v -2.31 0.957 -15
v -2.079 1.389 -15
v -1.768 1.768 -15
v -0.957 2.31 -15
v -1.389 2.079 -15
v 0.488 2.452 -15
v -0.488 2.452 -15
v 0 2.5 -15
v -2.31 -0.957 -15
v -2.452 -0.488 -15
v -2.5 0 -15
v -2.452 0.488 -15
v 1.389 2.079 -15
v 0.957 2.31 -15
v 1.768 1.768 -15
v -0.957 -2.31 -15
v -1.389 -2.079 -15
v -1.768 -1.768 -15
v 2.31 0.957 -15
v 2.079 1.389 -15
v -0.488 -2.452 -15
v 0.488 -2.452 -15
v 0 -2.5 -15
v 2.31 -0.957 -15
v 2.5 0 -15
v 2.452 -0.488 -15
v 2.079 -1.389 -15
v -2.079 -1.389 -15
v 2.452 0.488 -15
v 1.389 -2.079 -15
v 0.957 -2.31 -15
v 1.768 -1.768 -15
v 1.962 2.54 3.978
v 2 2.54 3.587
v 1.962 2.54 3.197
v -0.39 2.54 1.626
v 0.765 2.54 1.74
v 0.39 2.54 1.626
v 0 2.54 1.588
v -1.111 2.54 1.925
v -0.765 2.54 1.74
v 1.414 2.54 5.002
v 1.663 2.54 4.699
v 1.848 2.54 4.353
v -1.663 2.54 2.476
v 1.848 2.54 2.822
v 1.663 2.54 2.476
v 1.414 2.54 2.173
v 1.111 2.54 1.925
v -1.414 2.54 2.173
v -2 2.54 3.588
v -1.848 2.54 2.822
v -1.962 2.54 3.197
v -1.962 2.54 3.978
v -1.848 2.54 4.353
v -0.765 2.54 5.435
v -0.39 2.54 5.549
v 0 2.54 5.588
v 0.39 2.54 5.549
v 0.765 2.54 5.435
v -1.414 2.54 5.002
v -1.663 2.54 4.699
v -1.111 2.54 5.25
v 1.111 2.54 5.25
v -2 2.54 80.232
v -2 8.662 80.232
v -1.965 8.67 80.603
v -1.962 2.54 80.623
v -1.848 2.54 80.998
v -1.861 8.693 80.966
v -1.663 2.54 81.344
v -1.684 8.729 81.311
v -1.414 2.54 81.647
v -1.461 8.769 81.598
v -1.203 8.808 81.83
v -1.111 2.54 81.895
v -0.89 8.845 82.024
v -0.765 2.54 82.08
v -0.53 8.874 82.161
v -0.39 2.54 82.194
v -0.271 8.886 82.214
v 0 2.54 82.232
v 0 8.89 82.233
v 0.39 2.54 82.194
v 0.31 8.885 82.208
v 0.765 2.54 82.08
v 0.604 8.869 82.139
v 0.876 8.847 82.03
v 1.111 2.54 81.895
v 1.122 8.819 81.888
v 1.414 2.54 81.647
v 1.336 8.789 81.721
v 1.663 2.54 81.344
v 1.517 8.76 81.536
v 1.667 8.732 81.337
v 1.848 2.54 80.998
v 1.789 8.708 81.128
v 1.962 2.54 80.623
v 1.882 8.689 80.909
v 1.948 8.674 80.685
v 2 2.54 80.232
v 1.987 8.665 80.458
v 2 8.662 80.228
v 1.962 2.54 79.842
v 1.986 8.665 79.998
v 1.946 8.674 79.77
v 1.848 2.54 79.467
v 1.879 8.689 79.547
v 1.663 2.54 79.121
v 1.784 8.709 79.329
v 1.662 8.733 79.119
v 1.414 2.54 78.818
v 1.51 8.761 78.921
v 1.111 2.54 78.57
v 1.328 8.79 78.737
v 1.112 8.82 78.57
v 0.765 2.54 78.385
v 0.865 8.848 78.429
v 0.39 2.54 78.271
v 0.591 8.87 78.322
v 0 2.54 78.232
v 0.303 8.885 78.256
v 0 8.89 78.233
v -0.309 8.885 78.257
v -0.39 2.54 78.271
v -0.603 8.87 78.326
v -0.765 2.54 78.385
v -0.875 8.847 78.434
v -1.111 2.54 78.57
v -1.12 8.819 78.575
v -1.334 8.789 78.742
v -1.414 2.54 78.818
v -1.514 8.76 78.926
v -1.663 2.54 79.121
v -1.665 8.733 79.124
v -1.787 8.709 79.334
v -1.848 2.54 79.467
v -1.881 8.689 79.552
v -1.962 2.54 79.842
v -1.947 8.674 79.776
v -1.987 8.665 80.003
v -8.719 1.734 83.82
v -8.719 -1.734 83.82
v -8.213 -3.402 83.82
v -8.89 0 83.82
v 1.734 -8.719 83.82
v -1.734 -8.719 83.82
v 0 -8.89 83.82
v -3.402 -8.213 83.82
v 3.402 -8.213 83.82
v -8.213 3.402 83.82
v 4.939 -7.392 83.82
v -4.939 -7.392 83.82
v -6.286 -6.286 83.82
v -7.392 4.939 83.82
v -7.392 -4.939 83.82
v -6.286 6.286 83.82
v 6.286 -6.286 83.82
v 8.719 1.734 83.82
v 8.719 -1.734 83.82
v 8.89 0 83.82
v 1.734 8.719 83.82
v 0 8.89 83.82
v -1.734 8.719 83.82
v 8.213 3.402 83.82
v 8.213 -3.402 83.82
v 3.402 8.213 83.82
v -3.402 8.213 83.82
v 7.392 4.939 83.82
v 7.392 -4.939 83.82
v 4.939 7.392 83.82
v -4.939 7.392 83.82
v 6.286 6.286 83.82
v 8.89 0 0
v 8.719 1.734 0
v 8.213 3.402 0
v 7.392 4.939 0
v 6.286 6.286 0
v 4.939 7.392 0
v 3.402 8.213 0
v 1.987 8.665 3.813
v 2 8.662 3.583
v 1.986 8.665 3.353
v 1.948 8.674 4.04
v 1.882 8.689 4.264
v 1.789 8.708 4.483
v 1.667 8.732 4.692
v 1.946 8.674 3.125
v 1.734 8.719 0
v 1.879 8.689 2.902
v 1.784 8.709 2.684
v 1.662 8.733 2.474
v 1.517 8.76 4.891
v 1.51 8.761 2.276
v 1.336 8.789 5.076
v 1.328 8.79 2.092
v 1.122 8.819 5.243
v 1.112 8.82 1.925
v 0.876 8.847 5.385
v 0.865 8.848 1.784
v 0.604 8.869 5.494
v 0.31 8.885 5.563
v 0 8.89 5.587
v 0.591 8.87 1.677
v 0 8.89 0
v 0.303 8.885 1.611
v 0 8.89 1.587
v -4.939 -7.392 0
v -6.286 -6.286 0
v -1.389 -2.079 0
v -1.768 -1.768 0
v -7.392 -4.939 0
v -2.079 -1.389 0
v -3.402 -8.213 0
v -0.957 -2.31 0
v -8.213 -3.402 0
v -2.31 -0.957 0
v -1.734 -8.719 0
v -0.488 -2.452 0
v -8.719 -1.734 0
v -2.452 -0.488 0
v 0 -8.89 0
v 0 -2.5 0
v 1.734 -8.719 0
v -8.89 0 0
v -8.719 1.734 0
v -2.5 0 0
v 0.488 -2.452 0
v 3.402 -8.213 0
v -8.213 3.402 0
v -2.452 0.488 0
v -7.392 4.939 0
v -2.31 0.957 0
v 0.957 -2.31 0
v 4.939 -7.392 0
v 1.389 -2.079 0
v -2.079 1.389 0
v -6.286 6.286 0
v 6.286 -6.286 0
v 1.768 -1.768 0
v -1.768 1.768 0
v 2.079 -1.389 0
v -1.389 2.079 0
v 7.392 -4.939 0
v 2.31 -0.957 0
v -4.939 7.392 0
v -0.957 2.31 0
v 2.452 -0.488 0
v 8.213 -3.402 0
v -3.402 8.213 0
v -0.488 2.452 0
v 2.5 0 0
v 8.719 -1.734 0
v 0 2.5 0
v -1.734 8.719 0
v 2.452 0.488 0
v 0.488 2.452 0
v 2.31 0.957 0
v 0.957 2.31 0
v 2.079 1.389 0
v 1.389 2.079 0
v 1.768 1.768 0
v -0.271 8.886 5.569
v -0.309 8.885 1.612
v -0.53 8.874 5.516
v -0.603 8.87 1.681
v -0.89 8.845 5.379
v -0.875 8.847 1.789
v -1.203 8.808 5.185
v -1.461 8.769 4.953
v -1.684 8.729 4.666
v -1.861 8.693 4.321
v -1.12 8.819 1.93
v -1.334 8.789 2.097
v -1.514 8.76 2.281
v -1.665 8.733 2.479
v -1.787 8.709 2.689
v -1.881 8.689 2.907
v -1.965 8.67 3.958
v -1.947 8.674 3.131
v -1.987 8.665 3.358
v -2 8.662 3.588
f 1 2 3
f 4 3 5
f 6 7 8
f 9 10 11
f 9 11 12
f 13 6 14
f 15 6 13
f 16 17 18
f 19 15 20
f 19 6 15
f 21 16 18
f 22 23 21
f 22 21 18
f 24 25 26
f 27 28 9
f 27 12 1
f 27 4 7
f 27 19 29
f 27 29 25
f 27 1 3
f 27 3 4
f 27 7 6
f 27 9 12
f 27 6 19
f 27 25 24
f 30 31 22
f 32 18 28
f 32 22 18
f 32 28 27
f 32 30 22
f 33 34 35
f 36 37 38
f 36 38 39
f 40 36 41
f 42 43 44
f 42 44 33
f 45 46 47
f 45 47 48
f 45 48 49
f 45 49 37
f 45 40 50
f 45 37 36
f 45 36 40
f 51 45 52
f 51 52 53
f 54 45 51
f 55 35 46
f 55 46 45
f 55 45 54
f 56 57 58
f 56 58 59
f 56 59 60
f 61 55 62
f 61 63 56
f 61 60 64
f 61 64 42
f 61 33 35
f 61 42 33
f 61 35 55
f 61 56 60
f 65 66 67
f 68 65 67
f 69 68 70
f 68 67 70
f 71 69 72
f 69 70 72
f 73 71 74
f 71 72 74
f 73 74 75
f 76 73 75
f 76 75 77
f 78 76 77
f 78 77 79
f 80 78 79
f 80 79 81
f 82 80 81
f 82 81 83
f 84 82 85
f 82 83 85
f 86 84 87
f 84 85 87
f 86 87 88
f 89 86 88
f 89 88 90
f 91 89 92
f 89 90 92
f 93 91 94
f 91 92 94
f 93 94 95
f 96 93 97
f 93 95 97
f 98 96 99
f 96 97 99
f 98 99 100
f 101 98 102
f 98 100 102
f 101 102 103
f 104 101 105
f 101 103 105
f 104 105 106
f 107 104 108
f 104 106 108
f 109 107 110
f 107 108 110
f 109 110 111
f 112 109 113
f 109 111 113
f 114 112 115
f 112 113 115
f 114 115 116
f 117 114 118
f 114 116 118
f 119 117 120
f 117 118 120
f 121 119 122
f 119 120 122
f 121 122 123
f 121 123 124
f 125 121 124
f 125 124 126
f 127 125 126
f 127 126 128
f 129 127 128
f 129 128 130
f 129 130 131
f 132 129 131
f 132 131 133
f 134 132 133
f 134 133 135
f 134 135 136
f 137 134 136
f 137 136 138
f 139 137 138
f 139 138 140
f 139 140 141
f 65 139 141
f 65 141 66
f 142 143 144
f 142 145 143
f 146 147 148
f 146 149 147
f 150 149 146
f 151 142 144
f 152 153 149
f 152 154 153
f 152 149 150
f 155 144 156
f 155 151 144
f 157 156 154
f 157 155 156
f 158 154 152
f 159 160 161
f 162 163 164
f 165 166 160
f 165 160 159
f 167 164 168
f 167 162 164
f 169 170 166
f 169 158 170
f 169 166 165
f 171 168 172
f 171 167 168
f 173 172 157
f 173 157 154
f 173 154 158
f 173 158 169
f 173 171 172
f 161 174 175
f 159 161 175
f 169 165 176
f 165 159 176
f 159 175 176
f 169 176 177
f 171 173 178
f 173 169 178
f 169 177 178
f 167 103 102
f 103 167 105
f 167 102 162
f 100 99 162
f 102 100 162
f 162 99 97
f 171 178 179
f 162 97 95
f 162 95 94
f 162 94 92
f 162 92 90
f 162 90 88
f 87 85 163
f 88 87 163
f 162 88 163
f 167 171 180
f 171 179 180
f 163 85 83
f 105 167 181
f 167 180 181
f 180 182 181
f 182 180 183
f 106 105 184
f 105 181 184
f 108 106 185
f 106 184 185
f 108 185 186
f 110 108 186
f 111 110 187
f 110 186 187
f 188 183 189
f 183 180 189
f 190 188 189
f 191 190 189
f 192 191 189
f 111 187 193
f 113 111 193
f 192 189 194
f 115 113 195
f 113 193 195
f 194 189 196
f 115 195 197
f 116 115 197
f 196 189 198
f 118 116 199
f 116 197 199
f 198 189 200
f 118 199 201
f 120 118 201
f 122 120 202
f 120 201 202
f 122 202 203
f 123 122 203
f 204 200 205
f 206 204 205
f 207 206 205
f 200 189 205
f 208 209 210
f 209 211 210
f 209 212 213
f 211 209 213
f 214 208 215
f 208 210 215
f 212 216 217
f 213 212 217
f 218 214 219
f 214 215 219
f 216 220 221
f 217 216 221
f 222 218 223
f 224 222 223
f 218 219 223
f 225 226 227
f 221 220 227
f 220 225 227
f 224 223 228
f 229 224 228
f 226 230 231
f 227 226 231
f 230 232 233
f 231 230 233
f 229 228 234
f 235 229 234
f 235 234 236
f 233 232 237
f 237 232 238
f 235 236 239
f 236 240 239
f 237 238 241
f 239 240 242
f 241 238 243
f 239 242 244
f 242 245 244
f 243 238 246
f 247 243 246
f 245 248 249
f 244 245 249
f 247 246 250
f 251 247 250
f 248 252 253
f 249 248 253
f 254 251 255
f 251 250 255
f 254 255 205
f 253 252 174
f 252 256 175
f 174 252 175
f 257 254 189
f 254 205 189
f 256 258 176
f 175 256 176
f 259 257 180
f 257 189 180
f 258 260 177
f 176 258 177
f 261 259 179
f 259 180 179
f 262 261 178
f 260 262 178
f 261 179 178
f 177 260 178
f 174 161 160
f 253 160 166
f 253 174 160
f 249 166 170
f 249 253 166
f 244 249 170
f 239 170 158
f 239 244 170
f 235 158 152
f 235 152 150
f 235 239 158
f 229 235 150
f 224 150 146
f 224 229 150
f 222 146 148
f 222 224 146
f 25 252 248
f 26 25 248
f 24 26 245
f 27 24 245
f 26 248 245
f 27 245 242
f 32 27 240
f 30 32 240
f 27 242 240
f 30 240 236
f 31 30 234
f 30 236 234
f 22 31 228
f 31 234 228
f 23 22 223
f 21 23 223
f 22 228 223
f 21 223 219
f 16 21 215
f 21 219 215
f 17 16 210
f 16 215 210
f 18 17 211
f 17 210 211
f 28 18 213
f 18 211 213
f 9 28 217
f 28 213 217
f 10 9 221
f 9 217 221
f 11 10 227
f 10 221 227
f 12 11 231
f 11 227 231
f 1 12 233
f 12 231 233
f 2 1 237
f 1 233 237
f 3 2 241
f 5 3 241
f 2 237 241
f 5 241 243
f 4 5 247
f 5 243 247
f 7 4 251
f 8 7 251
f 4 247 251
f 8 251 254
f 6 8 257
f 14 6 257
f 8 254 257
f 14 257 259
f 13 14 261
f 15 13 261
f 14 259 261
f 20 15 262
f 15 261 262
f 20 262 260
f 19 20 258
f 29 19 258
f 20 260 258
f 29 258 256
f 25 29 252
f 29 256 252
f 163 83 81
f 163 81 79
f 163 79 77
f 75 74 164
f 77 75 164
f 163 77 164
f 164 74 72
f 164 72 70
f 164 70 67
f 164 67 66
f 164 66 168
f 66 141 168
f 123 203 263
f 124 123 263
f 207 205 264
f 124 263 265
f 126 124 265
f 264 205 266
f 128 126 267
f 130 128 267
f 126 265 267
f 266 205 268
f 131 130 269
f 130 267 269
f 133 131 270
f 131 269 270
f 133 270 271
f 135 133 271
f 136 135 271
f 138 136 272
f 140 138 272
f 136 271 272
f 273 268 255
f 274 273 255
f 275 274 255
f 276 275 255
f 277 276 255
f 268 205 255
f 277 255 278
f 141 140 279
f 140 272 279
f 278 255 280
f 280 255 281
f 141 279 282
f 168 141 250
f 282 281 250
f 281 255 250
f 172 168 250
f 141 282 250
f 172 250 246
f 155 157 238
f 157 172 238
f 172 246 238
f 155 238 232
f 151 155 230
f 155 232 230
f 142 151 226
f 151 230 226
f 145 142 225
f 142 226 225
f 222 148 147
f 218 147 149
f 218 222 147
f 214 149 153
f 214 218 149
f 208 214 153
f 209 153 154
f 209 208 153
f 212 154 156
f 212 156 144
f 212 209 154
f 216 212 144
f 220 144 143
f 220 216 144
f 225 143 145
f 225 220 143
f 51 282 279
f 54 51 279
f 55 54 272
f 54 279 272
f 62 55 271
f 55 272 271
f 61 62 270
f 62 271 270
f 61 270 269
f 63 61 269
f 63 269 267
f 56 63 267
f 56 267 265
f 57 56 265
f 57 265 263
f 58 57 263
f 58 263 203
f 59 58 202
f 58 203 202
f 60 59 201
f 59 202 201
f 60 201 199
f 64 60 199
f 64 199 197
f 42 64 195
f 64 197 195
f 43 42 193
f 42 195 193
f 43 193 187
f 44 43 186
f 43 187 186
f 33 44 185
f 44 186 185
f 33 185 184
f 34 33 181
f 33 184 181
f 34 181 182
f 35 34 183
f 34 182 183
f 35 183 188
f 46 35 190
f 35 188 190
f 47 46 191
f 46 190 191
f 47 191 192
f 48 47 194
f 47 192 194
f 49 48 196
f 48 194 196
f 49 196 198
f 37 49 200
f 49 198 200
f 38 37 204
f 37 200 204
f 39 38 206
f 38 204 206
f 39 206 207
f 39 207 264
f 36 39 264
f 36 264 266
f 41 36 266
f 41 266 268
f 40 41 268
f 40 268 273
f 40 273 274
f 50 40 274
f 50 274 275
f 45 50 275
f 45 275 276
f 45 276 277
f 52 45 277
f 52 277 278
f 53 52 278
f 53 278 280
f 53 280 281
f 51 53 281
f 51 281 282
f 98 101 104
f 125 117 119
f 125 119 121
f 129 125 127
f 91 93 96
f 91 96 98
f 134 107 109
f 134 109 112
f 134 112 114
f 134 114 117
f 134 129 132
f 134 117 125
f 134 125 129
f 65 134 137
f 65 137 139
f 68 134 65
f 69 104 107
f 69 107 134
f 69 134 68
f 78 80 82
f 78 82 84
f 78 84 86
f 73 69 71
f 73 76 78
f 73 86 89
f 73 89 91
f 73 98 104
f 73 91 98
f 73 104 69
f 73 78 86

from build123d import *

# Parameters (mm, degrees)
F0_W        = 17.78
F0_H        = 17.78
F1_DEPTH    = 83.82
F2_R        = 2.5
F3_DEPTH    = 15
F4_R        = 2
F5_DEPTH    = 6.35
F6_T1_DEPTH = 128.27


# Not quite as in the source:
# - a fillet or chamfer that OpenCascade refuses, or shapes differently, is made with other operations: its cross-section is extruded or revolved along the edge and cut away or added


with BuildPart() as f1:
    # F0 (on Top) → F1 (new body)
    with BuildSketch(Plane.XY):
        Rectangle(F0_W, F0_H)
    extrude(amount=F1_DEPTH)

    # F2 (on face) → F3 (join)
    with BuildSketch(Plane(origin=(0, 0, 0), x_dir=(1, 0, 0), z_dir=(0, 0, -1))):
        Circle(F2_R)
    extrude(amount=F3_DEPTH)

    # F4 (on face) → F5 (cut)
    with BuildSketch(Plane(origin=(0, 8.89, 0), x_dir=(-1, 0, 0), z_dir=(0, 1, 0))):
        with Locations((0, 3.5875)):
            Circle(F4_R)
        with Locations((0, 80.2325)):
            Circle(F4_R)
    extrude(amount=-F5_DEPTH, mode=Mode.SUBTRACT)

    # F6: fillet of radius 8.89 on 4 edges, made by hand

    # F6_s2 → F6_t1 (cut)
    with BuildSketch(Plane.XY.offset(-22.225)):
        with BuildLine():
            ThreePointArc((8.89, 0), (6.2861792847, -6.2861792847), (0, -8.89))
            Line((0, -8.89), (8.89, -8.89))
            Line((8.89, -8.89), (8.89, 0))
        make_face()
        with BuildLine():
            ThreePointArc((8.89, 0), (6.2861792847, 6.2861792847), (0, 8.89))
            Line((0, 8.89), (8.89, 8.89))
            Line((8.89, 8.89), (8.89, 0))
        make_face()
        with BuildLine():
            ThreePointArc((0, 8.89), (-6.2861792847, 6.2861792847), (-8.89, 0))
            Line((-8.89, 0), (-8.89, 8.89))
            Line((-8.89, 8.89), (0, 8.89))
        make_face()
        with BuildLine():
            ThreePointArc((0, -8.89), (-6.2861792847, -6.2861792847), (-8.89, 0))
            Line((-8.89, 0), (-8.89, -8.89))
            Line((-8.89, -8.89), (0, -8.89))
        make_face()
    extrude(amount=F6_T1_DEPTH, mode=Mode.SUBTRACT)


solid = f1.part
